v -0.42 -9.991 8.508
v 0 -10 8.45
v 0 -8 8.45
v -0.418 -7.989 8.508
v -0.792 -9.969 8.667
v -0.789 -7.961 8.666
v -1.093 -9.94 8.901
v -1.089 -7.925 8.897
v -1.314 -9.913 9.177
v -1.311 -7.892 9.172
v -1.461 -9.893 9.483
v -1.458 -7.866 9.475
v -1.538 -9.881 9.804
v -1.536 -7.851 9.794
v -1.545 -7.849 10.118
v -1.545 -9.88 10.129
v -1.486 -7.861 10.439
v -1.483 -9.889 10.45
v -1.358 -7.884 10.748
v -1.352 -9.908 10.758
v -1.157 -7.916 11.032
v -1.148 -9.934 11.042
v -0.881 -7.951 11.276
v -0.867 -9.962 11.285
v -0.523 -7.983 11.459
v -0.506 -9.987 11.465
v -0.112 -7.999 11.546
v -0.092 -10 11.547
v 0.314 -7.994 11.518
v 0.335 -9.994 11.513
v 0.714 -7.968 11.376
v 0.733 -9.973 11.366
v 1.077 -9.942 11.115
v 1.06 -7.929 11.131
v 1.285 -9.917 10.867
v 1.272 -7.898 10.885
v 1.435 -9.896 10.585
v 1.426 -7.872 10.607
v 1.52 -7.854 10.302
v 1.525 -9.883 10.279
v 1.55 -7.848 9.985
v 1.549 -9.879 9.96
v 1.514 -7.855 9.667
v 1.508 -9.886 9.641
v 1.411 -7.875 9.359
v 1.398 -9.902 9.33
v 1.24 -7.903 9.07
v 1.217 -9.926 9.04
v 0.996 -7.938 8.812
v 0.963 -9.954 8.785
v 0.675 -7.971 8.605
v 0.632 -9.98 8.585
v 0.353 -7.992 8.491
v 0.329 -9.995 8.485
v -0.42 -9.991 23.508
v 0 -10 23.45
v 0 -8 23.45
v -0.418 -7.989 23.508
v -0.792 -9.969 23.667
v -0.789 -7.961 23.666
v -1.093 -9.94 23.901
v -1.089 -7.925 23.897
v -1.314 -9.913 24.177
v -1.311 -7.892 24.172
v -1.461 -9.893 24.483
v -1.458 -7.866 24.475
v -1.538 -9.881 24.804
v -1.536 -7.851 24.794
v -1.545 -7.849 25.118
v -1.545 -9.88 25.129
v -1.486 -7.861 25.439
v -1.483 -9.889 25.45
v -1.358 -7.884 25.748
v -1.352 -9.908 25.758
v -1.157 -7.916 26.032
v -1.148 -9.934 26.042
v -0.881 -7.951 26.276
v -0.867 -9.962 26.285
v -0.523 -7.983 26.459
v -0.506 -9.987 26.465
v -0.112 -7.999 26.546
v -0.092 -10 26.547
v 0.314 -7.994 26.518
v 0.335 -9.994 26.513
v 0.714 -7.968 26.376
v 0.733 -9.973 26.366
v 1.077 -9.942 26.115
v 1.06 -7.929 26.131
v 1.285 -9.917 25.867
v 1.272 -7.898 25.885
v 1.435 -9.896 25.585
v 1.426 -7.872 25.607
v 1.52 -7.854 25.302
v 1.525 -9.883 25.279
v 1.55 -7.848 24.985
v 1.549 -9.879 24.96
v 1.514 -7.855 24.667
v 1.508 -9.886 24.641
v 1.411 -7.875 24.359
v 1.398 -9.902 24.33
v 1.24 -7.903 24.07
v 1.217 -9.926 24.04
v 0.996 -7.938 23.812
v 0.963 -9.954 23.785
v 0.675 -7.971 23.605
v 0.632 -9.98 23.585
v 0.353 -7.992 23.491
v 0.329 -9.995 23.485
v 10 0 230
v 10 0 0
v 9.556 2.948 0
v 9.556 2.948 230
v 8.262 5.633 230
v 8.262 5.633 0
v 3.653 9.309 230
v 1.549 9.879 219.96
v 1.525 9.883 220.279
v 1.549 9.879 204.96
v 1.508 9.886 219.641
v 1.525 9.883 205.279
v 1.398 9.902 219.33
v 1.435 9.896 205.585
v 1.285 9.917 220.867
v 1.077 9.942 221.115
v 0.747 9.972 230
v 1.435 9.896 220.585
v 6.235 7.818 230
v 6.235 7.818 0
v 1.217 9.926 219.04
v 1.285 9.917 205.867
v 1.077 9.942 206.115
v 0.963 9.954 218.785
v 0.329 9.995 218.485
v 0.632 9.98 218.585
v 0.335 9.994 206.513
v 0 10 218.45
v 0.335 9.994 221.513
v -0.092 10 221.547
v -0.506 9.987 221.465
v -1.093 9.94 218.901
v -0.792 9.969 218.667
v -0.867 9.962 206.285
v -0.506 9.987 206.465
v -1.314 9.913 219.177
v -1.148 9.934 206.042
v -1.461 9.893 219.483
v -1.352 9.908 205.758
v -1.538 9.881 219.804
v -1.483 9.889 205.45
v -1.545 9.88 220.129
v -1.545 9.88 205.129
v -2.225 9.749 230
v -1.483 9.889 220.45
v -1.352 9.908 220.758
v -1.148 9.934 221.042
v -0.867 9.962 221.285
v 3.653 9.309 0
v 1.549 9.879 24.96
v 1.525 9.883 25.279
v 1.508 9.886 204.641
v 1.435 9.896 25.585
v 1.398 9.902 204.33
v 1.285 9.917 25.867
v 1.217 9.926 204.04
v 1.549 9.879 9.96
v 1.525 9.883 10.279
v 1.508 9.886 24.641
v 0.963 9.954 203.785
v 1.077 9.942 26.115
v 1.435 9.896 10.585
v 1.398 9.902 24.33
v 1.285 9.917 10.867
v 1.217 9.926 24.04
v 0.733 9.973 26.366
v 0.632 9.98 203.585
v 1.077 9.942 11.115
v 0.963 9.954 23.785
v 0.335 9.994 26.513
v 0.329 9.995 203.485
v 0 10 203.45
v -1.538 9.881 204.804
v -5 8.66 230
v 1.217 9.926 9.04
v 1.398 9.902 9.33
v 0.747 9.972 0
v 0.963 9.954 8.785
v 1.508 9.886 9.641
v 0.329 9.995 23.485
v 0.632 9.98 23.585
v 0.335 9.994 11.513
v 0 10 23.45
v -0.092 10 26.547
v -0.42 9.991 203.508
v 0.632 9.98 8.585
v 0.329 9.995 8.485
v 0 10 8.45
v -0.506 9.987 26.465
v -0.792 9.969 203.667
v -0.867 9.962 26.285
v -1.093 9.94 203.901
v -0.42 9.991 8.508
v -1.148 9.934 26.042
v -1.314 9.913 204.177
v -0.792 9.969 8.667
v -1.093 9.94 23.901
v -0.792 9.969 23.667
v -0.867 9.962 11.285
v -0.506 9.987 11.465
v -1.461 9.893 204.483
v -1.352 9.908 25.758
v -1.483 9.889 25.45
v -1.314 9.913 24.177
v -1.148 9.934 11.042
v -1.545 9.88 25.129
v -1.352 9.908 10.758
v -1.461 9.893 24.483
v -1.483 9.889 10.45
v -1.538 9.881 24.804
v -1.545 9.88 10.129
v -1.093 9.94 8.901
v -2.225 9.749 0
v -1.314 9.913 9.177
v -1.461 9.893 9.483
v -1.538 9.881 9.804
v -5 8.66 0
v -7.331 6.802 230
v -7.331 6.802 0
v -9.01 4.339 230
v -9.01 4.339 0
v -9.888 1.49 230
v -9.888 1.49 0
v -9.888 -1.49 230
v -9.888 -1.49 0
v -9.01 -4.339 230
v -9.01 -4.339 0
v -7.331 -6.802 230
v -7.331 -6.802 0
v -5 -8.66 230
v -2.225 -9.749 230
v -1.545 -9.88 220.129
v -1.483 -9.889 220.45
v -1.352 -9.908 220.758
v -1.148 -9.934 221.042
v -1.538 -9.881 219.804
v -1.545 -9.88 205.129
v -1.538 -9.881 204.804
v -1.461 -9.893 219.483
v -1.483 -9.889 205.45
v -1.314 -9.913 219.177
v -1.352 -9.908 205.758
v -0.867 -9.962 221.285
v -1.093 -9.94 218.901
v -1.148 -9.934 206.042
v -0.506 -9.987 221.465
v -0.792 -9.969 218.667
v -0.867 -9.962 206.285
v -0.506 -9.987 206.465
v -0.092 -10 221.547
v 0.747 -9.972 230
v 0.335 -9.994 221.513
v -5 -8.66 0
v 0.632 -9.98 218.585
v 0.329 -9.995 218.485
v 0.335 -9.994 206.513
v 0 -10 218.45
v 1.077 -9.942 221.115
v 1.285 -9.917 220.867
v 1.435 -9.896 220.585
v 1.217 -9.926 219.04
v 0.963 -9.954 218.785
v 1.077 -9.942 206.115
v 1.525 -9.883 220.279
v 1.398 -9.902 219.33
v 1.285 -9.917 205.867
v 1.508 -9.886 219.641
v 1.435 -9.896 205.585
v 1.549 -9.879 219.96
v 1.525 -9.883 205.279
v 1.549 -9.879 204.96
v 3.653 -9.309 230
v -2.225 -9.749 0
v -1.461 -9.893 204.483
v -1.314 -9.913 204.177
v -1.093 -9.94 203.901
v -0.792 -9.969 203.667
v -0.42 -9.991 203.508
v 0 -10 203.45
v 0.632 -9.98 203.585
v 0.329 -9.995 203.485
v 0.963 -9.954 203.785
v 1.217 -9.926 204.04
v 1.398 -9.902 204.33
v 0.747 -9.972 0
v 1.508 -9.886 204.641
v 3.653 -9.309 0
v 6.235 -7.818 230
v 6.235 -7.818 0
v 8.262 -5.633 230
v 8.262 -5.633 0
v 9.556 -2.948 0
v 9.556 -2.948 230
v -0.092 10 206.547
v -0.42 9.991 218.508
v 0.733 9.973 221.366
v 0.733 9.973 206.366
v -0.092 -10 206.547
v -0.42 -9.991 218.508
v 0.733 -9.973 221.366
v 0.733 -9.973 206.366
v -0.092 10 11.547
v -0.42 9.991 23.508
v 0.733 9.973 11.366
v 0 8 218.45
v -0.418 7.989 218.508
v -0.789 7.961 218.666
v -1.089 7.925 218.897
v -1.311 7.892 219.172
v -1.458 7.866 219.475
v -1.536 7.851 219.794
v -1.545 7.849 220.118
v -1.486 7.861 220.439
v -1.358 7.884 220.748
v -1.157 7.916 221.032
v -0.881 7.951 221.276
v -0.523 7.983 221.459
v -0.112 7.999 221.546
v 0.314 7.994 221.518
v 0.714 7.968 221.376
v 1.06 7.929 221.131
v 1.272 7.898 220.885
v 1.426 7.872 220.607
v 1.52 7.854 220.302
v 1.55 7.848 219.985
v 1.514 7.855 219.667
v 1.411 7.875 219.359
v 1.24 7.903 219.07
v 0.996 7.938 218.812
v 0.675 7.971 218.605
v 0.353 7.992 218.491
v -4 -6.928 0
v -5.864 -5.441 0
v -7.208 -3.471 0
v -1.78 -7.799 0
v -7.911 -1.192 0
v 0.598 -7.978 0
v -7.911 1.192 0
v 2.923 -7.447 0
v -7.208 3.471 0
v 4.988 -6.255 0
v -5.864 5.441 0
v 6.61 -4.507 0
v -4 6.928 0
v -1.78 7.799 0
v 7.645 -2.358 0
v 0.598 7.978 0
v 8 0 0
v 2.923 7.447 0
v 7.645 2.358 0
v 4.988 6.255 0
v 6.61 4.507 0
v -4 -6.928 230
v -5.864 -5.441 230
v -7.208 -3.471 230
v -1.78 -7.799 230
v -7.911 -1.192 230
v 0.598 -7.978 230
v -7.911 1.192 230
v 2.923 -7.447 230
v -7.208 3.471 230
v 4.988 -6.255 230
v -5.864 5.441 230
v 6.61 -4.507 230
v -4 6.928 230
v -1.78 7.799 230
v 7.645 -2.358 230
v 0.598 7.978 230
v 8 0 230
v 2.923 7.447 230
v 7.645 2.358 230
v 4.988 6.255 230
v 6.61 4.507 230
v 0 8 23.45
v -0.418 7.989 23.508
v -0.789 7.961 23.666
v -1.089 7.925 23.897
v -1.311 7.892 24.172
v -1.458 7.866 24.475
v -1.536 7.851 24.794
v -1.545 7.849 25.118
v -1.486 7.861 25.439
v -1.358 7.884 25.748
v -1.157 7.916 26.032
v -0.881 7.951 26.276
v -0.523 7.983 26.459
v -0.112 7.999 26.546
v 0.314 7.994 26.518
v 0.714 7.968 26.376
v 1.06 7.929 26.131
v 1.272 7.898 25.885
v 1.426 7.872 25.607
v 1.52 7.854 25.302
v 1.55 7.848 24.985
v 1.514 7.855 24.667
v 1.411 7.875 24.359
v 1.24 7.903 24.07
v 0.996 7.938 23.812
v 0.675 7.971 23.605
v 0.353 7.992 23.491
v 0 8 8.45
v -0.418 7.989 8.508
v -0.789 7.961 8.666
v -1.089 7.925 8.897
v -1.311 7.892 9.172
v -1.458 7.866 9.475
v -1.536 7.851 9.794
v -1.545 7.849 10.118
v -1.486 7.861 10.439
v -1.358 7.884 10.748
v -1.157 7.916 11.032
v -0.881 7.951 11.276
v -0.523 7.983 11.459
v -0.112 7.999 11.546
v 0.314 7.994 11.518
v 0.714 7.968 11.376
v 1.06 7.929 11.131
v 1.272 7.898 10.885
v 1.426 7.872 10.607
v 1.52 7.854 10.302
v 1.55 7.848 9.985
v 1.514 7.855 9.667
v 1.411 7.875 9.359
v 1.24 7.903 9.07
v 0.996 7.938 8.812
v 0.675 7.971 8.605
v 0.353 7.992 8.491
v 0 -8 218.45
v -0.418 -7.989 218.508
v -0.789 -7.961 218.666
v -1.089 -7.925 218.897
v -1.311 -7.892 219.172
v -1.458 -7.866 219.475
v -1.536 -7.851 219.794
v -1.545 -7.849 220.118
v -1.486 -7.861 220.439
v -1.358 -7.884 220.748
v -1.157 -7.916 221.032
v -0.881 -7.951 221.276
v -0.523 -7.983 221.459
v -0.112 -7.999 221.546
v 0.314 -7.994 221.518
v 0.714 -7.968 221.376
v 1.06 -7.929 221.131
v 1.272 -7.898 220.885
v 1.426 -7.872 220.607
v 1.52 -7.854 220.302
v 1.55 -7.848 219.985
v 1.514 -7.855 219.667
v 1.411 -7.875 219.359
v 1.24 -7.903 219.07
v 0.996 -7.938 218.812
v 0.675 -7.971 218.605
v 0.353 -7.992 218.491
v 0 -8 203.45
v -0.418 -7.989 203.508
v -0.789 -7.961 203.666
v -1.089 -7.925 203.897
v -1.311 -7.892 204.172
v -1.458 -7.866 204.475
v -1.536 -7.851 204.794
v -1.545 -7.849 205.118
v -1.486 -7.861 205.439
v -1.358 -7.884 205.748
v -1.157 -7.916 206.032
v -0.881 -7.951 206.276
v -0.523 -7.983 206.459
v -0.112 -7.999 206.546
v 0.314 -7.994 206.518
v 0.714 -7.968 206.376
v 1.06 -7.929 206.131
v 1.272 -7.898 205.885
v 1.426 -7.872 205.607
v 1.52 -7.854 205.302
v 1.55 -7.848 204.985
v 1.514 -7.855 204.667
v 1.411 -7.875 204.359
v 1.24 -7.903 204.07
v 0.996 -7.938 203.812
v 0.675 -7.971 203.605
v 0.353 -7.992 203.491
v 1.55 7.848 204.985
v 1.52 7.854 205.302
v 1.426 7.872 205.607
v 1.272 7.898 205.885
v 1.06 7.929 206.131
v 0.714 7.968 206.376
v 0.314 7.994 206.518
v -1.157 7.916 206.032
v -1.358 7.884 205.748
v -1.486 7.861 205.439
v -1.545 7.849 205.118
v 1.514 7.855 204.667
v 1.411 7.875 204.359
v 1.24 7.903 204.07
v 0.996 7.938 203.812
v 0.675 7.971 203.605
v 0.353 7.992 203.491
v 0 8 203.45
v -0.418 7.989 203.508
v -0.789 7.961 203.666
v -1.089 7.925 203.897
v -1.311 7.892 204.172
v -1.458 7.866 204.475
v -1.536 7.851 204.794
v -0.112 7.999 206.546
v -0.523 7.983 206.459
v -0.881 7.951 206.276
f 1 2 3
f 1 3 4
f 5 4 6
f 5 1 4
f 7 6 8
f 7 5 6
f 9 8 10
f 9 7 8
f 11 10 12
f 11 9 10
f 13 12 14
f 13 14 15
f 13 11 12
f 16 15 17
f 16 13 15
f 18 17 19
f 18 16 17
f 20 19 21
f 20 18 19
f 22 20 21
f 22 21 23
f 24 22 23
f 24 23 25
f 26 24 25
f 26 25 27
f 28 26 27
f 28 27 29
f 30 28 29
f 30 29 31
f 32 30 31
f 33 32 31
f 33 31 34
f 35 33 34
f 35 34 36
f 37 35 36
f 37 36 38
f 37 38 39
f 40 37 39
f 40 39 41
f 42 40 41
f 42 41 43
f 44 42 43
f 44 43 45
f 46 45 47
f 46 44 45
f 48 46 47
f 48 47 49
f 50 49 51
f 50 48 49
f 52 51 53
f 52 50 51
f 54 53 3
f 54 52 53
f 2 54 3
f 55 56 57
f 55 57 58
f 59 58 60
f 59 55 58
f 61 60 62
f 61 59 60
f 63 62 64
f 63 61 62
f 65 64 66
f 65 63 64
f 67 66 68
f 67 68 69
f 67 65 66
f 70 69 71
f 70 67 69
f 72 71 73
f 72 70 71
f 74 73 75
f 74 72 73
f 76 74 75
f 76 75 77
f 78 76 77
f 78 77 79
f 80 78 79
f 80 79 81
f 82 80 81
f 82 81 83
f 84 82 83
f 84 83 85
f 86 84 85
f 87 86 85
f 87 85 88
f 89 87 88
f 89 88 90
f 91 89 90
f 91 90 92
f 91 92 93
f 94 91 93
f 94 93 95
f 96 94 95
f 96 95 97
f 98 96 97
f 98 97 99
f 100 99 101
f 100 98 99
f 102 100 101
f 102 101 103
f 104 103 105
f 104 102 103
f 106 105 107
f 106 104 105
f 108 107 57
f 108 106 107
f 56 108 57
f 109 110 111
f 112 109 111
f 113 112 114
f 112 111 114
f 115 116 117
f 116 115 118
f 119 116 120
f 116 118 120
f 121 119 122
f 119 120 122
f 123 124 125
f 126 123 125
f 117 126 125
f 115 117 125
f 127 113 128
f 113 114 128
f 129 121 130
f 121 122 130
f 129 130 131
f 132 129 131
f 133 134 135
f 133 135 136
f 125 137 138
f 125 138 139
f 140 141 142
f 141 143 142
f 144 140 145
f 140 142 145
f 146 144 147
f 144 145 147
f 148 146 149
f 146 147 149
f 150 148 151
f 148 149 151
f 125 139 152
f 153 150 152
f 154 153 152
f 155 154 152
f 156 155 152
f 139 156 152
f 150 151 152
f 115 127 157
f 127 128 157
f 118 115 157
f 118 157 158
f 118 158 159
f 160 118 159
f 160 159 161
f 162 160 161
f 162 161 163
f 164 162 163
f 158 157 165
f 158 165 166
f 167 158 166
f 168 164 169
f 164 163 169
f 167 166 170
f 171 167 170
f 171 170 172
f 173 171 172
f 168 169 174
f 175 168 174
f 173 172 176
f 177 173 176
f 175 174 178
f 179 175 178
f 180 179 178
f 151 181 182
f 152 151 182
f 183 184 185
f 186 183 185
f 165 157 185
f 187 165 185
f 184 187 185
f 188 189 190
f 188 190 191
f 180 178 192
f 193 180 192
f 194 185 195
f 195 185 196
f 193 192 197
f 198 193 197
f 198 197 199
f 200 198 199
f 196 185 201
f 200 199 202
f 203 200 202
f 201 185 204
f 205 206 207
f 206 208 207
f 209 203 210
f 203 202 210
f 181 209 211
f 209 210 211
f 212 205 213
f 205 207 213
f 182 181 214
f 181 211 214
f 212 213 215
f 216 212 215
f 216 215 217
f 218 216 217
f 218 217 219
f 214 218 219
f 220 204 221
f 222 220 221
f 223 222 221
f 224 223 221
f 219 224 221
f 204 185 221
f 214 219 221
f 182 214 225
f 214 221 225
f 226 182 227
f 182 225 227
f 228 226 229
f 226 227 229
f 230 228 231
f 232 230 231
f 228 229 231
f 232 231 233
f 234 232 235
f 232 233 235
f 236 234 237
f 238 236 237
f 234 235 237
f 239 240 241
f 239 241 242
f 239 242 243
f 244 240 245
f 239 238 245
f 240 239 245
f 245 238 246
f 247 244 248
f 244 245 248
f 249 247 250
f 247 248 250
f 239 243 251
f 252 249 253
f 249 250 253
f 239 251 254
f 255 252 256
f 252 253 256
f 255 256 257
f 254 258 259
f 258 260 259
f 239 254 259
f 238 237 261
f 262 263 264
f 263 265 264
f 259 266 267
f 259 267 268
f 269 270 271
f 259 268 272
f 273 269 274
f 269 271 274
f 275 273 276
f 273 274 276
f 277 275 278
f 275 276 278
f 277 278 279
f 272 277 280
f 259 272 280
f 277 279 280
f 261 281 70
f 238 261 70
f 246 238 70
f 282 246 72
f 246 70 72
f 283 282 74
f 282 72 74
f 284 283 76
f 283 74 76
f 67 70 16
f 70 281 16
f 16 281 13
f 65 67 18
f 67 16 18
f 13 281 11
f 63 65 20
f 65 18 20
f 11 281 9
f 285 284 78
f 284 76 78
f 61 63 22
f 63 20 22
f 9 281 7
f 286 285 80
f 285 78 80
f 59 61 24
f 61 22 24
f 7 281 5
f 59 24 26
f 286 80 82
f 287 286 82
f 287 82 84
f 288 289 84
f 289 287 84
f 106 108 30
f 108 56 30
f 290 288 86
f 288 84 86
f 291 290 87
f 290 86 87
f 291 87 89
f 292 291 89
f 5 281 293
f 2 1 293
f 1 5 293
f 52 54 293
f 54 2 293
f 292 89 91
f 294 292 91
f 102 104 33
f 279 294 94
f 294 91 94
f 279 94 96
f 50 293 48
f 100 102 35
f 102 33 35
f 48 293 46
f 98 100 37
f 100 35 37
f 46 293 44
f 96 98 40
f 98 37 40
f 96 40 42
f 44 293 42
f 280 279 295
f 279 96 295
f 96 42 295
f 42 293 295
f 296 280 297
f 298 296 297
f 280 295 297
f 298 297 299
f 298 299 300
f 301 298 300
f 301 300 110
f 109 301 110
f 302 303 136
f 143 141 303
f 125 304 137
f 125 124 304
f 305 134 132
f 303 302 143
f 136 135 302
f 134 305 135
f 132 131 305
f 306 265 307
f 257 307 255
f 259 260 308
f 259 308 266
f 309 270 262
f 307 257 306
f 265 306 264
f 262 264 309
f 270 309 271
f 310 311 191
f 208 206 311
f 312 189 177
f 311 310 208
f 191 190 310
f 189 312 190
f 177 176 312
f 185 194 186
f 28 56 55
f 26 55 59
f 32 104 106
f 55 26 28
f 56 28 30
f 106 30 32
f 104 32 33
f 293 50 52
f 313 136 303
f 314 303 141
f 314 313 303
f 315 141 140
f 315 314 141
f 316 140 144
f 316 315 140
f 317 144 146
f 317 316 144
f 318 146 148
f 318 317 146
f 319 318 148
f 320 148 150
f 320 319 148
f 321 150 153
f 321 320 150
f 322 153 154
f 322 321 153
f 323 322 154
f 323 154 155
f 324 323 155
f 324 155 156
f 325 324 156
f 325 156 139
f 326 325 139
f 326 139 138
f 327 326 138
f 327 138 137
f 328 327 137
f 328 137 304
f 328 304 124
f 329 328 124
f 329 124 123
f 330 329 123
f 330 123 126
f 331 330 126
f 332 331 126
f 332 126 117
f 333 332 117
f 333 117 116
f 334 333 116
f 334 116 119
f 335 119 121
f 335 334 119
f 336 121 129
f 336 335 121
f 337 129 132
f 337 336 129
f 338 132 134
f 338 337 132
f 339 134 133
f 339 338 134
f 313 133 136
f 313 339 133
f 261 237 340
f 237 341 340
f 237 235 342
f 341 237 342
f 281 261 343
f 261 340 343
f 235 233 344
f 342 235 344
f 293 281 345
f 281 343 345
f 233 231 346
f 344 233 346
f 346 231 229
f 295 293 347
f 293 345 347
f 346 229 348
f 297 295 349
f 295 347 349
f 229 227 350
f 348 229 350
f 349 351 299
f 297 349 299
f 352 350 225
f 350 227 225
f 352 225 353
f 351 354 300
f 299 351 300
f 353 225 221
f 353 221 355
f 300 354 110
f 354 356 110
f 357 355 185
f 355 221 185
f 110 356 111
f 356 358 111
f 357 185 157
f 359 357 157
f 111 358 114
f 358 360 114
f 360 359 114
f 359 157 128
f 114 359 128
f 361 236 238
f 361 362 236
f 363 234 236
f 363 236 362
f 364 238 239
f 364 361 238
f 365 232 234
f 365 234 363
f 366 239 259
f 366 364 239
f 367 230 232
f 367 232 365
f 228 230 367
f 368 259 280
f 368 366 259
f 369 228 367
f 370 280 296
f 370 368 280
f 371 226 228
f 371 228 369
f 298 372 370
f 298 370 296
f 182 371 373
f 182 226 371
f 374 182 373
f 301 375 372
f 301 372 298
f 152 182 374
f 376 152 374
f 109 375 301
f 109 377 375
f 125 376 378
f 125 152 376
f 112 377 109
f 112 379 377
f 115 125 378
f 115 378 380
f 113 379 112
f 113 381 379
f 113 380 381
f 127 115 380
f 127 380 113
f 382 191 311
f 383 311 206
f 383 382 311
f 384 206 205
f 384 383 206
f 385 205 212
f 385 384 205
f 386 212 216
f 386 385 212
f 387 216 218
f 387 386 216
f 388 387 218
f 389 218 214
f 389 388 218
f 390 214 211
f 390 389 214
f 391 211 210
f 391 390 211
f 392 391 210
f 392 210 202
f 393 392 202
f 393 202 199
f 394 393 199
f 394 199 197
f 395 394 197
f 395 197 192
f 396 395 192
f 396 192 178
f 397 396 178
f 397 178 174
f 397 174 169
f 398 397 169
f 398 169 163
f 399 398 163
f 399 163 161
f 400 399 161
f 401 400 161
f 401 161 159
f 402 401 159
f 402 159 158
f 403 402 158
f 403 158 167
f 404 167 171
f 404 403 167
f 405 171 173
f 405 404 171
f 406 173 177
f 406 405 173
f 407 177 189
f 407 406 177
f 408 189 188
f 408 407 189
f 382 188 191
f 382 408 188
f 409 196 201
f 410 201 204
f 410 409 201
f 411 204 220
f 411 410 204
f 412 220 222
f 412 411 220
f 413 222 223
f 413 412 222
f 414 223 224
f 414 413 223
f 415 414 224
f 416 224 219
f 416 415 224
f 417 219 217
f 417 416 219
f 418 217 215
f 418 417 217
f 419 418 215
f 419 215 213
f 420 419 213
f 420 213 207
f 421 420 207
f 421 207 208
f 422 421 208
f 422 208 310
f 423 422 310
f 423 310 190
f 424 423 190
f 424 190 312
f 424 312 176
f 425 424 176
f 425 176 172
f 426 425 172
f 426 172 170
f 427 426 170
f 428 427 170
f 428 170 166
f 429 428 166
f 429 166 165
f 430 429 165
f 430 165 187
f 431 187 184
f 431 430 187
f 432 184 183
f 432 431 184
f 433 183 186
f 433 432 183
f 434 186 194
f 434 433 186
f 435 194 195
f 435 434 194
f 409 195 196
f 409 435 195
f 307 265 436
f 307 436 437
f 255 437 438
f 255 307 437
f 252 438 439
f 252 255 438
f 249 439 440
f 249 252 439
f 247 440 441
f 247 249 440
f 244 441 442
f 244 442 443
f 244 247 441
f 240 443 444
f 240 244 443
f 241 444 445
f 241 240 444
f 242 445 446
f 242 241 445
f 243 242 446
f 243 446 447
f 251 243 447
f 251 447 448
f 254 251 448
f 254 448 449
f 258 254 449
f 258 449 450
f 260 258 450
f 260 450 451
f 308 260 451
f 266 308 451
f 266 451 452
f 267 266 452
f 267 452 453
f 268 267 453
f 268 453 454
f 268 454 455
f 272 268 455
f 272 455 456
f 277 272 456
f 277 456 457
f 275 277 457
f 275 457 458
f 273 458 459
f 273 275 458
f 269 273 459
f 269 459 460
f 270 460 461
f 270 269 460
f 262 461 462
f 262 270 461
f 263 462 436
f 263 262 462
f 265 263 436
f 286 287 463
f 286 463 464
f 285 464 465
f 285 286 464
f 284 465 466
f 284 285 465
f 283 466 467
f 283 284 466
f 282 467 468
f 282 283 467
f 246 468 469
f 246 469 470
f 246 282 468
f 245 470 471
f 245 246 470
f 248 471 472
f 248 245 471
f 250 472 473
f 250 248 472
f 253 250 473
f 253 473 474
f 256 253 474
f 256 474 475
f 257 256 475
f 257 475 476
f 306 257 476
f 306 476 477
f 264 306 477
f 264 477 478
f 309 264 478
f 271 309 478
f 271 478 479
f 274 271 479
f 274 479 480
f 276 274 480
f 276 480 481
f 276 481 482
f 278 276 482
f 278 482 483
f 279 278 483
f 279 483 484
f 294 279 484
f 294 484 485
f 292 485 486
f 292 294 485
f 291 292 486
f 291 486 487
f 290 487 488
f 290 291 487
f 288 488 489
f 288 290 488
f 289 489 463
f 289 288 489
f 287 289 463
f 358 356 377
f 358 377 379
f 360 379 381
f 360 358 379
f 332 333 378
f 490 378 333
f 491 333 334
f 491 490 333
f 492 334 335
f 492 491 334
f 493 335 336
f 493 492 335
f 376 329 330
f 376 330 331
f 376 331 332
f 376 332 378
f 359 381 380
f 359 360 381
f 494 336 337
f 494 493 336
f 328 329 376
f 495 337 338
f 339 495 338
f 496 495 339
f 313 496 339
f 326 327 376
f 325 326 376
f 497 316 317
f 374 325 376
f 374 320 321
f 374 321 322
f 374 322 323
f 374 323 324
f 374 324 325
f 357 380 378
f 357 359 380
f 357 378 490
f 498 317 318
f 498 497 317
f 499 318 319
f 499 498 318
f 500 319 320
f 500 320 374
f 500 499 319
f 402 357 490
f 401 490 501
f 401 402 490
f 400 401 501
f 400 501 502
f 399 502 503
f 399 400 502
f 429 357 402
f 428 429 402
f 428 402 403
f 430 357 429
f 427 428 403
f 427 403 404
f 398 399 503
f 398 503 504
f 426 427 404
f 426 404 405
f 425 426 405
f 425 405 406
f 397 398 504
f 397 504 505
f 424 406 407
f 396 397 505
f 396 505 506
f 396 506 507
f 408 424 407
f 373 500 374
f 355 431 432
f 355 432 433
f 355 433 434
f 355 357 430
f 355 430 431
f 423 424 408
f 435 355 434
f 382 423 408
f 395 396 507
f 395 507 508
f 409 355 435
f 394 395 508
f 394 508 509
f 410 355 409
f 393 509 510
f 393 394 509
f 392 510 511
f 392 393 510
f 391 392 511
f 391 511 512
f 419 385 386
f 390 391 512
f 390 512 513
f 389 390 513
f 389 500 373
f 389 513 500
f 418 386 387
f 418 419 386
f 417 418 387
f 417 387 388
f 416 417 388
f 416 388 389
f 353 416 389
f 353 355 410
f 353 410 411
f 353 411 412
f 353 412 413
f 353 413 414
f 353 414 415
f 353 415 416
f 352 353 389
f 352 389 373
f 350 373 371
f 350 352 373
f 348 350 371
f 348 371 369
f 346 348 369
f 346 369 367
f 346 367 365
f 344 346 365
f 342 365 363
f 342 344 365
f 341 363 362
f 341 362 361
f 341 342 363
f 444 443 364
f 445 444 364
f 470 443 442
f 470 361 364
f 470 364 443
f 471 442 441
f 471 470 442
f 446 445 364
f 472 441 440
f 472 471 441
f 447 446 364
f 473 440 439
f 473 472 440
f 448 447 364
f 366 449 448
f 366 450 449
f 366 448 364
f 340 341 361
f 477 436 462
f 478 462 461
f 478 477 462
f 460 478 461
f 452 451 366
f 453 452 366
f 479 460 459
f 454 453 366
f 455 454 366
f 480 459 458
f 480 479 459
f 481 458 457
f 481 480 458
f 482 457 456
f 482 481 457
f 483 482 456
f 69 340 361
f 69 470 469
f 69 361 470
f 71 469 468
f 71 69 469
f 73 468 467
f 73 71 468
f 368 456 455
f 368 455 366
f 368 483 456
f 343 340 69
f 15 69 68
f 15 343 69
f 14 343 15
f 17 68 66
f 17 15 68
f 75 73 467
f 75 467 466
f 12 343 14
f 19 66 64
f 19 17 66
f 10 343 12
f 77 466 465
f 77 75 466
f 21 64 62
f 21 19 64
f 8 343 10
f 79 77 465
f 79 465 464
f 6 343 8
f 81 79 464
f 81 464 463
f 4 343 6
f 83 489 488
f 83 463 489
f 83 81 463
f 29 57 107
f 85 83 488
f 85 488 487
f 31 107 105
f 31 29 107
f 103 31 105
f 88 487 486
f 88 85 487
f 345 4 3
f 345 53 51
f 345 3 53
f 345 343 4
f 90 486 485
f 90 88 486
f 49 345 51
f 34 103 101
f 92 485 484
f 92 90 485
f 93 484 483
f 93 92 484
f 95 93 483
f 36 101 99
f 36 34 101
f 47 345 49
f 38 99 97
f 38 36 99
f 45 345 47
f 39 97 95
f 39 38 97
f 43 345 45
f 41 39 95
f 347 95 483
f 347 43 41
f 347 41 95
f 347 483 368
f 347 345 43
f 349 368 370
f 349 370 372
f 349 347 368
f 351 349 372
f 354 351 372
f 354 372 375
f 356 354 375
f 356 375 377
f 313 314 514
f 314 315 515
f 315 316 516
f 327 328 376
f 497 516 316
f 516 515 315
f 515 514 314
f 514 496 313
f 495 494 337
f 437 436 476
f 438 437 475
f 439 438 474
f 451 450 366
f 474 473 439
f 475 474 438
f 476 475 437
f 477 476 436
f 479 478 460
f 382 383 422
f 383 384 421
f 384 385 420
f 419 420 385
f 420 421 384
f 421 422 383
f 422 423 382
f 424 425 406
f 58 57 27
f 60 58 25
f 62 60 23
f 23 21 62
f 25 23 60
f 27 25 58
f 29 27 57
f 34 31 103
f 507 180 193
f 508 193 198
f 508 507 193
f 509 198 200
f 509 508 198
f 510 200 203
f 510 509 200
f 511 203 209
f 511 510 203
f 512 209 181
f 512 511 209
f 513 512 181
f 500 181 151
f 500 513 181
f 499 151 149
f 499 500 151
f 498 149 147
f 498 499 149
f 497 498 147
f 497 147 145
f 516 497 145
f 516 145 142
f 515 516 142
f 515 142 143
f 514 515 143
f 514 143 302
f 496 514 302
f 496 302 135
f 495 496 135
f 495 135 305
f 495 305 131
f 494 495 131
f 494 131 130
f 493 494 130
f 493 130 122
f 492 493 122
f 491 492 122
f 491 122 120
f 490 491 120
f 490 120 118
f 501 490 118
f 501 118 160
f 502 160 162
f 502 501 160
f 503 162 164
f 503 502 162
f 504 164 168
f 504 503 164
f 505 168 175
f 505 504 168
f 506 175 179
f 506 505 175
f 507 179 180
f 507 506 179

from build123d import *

# Parameters (mm, degrees)
SKETCH_1_R               = 10
SKETCH_1_R_2             = 8
EXTRUDE_1_DEPTH          = 230
CUT_EXTRUDE_1_DEPTH      = 231.434372436
CUT_EXTRUDE_1_DEPTH_BACK = 230
SKETCH_2_R               = 1.55


with BuildPart() as part:
    # 草图1 → 凸台-拉伸1 (new body)
    with BuildSketch(Plane.XY):
        Circle(SKETCH_1_R)
        Circle(SKETCH_1_R_2, mode=Mode.SUBTRACT)
    extrude(amount=EXTRUDE_1_DEPTH)

    # 草图2 → 切除-拉伸1 (cut, two sides: drawn at the far end of the back side and taken through both)
    with BuildSketch(Plane(origin=(0, 0, 0), x_dir=(1, 0, 0), z_dir=(0, 1, 0)).offset(-CUT_EXTRUDE_1_DEPTH_BACK)):
        with Locations(Location((0, -10, 0), (0, 0, 90))):
            Circle(SKETCH_2_R)
        with Locations(Location((0, -25, 0), (0, 0, 90))):
            Circle(SKETCH_2_R)
        with Locations(Location((0, -220, 0), (0, 0, 90))):
            Circle(SKETCH_2_R)
        with Locations(Location((0, -205, 0), (0, 0, 90))):
            Circle(SKETCH_2_R)
    extrude(amount=CUT_EXTRUDE_1_DEPTH + CUT_EXTRUDE_1_DEPTH_BACK, mode=Mode.SUBTRACT)


solid = part.part
